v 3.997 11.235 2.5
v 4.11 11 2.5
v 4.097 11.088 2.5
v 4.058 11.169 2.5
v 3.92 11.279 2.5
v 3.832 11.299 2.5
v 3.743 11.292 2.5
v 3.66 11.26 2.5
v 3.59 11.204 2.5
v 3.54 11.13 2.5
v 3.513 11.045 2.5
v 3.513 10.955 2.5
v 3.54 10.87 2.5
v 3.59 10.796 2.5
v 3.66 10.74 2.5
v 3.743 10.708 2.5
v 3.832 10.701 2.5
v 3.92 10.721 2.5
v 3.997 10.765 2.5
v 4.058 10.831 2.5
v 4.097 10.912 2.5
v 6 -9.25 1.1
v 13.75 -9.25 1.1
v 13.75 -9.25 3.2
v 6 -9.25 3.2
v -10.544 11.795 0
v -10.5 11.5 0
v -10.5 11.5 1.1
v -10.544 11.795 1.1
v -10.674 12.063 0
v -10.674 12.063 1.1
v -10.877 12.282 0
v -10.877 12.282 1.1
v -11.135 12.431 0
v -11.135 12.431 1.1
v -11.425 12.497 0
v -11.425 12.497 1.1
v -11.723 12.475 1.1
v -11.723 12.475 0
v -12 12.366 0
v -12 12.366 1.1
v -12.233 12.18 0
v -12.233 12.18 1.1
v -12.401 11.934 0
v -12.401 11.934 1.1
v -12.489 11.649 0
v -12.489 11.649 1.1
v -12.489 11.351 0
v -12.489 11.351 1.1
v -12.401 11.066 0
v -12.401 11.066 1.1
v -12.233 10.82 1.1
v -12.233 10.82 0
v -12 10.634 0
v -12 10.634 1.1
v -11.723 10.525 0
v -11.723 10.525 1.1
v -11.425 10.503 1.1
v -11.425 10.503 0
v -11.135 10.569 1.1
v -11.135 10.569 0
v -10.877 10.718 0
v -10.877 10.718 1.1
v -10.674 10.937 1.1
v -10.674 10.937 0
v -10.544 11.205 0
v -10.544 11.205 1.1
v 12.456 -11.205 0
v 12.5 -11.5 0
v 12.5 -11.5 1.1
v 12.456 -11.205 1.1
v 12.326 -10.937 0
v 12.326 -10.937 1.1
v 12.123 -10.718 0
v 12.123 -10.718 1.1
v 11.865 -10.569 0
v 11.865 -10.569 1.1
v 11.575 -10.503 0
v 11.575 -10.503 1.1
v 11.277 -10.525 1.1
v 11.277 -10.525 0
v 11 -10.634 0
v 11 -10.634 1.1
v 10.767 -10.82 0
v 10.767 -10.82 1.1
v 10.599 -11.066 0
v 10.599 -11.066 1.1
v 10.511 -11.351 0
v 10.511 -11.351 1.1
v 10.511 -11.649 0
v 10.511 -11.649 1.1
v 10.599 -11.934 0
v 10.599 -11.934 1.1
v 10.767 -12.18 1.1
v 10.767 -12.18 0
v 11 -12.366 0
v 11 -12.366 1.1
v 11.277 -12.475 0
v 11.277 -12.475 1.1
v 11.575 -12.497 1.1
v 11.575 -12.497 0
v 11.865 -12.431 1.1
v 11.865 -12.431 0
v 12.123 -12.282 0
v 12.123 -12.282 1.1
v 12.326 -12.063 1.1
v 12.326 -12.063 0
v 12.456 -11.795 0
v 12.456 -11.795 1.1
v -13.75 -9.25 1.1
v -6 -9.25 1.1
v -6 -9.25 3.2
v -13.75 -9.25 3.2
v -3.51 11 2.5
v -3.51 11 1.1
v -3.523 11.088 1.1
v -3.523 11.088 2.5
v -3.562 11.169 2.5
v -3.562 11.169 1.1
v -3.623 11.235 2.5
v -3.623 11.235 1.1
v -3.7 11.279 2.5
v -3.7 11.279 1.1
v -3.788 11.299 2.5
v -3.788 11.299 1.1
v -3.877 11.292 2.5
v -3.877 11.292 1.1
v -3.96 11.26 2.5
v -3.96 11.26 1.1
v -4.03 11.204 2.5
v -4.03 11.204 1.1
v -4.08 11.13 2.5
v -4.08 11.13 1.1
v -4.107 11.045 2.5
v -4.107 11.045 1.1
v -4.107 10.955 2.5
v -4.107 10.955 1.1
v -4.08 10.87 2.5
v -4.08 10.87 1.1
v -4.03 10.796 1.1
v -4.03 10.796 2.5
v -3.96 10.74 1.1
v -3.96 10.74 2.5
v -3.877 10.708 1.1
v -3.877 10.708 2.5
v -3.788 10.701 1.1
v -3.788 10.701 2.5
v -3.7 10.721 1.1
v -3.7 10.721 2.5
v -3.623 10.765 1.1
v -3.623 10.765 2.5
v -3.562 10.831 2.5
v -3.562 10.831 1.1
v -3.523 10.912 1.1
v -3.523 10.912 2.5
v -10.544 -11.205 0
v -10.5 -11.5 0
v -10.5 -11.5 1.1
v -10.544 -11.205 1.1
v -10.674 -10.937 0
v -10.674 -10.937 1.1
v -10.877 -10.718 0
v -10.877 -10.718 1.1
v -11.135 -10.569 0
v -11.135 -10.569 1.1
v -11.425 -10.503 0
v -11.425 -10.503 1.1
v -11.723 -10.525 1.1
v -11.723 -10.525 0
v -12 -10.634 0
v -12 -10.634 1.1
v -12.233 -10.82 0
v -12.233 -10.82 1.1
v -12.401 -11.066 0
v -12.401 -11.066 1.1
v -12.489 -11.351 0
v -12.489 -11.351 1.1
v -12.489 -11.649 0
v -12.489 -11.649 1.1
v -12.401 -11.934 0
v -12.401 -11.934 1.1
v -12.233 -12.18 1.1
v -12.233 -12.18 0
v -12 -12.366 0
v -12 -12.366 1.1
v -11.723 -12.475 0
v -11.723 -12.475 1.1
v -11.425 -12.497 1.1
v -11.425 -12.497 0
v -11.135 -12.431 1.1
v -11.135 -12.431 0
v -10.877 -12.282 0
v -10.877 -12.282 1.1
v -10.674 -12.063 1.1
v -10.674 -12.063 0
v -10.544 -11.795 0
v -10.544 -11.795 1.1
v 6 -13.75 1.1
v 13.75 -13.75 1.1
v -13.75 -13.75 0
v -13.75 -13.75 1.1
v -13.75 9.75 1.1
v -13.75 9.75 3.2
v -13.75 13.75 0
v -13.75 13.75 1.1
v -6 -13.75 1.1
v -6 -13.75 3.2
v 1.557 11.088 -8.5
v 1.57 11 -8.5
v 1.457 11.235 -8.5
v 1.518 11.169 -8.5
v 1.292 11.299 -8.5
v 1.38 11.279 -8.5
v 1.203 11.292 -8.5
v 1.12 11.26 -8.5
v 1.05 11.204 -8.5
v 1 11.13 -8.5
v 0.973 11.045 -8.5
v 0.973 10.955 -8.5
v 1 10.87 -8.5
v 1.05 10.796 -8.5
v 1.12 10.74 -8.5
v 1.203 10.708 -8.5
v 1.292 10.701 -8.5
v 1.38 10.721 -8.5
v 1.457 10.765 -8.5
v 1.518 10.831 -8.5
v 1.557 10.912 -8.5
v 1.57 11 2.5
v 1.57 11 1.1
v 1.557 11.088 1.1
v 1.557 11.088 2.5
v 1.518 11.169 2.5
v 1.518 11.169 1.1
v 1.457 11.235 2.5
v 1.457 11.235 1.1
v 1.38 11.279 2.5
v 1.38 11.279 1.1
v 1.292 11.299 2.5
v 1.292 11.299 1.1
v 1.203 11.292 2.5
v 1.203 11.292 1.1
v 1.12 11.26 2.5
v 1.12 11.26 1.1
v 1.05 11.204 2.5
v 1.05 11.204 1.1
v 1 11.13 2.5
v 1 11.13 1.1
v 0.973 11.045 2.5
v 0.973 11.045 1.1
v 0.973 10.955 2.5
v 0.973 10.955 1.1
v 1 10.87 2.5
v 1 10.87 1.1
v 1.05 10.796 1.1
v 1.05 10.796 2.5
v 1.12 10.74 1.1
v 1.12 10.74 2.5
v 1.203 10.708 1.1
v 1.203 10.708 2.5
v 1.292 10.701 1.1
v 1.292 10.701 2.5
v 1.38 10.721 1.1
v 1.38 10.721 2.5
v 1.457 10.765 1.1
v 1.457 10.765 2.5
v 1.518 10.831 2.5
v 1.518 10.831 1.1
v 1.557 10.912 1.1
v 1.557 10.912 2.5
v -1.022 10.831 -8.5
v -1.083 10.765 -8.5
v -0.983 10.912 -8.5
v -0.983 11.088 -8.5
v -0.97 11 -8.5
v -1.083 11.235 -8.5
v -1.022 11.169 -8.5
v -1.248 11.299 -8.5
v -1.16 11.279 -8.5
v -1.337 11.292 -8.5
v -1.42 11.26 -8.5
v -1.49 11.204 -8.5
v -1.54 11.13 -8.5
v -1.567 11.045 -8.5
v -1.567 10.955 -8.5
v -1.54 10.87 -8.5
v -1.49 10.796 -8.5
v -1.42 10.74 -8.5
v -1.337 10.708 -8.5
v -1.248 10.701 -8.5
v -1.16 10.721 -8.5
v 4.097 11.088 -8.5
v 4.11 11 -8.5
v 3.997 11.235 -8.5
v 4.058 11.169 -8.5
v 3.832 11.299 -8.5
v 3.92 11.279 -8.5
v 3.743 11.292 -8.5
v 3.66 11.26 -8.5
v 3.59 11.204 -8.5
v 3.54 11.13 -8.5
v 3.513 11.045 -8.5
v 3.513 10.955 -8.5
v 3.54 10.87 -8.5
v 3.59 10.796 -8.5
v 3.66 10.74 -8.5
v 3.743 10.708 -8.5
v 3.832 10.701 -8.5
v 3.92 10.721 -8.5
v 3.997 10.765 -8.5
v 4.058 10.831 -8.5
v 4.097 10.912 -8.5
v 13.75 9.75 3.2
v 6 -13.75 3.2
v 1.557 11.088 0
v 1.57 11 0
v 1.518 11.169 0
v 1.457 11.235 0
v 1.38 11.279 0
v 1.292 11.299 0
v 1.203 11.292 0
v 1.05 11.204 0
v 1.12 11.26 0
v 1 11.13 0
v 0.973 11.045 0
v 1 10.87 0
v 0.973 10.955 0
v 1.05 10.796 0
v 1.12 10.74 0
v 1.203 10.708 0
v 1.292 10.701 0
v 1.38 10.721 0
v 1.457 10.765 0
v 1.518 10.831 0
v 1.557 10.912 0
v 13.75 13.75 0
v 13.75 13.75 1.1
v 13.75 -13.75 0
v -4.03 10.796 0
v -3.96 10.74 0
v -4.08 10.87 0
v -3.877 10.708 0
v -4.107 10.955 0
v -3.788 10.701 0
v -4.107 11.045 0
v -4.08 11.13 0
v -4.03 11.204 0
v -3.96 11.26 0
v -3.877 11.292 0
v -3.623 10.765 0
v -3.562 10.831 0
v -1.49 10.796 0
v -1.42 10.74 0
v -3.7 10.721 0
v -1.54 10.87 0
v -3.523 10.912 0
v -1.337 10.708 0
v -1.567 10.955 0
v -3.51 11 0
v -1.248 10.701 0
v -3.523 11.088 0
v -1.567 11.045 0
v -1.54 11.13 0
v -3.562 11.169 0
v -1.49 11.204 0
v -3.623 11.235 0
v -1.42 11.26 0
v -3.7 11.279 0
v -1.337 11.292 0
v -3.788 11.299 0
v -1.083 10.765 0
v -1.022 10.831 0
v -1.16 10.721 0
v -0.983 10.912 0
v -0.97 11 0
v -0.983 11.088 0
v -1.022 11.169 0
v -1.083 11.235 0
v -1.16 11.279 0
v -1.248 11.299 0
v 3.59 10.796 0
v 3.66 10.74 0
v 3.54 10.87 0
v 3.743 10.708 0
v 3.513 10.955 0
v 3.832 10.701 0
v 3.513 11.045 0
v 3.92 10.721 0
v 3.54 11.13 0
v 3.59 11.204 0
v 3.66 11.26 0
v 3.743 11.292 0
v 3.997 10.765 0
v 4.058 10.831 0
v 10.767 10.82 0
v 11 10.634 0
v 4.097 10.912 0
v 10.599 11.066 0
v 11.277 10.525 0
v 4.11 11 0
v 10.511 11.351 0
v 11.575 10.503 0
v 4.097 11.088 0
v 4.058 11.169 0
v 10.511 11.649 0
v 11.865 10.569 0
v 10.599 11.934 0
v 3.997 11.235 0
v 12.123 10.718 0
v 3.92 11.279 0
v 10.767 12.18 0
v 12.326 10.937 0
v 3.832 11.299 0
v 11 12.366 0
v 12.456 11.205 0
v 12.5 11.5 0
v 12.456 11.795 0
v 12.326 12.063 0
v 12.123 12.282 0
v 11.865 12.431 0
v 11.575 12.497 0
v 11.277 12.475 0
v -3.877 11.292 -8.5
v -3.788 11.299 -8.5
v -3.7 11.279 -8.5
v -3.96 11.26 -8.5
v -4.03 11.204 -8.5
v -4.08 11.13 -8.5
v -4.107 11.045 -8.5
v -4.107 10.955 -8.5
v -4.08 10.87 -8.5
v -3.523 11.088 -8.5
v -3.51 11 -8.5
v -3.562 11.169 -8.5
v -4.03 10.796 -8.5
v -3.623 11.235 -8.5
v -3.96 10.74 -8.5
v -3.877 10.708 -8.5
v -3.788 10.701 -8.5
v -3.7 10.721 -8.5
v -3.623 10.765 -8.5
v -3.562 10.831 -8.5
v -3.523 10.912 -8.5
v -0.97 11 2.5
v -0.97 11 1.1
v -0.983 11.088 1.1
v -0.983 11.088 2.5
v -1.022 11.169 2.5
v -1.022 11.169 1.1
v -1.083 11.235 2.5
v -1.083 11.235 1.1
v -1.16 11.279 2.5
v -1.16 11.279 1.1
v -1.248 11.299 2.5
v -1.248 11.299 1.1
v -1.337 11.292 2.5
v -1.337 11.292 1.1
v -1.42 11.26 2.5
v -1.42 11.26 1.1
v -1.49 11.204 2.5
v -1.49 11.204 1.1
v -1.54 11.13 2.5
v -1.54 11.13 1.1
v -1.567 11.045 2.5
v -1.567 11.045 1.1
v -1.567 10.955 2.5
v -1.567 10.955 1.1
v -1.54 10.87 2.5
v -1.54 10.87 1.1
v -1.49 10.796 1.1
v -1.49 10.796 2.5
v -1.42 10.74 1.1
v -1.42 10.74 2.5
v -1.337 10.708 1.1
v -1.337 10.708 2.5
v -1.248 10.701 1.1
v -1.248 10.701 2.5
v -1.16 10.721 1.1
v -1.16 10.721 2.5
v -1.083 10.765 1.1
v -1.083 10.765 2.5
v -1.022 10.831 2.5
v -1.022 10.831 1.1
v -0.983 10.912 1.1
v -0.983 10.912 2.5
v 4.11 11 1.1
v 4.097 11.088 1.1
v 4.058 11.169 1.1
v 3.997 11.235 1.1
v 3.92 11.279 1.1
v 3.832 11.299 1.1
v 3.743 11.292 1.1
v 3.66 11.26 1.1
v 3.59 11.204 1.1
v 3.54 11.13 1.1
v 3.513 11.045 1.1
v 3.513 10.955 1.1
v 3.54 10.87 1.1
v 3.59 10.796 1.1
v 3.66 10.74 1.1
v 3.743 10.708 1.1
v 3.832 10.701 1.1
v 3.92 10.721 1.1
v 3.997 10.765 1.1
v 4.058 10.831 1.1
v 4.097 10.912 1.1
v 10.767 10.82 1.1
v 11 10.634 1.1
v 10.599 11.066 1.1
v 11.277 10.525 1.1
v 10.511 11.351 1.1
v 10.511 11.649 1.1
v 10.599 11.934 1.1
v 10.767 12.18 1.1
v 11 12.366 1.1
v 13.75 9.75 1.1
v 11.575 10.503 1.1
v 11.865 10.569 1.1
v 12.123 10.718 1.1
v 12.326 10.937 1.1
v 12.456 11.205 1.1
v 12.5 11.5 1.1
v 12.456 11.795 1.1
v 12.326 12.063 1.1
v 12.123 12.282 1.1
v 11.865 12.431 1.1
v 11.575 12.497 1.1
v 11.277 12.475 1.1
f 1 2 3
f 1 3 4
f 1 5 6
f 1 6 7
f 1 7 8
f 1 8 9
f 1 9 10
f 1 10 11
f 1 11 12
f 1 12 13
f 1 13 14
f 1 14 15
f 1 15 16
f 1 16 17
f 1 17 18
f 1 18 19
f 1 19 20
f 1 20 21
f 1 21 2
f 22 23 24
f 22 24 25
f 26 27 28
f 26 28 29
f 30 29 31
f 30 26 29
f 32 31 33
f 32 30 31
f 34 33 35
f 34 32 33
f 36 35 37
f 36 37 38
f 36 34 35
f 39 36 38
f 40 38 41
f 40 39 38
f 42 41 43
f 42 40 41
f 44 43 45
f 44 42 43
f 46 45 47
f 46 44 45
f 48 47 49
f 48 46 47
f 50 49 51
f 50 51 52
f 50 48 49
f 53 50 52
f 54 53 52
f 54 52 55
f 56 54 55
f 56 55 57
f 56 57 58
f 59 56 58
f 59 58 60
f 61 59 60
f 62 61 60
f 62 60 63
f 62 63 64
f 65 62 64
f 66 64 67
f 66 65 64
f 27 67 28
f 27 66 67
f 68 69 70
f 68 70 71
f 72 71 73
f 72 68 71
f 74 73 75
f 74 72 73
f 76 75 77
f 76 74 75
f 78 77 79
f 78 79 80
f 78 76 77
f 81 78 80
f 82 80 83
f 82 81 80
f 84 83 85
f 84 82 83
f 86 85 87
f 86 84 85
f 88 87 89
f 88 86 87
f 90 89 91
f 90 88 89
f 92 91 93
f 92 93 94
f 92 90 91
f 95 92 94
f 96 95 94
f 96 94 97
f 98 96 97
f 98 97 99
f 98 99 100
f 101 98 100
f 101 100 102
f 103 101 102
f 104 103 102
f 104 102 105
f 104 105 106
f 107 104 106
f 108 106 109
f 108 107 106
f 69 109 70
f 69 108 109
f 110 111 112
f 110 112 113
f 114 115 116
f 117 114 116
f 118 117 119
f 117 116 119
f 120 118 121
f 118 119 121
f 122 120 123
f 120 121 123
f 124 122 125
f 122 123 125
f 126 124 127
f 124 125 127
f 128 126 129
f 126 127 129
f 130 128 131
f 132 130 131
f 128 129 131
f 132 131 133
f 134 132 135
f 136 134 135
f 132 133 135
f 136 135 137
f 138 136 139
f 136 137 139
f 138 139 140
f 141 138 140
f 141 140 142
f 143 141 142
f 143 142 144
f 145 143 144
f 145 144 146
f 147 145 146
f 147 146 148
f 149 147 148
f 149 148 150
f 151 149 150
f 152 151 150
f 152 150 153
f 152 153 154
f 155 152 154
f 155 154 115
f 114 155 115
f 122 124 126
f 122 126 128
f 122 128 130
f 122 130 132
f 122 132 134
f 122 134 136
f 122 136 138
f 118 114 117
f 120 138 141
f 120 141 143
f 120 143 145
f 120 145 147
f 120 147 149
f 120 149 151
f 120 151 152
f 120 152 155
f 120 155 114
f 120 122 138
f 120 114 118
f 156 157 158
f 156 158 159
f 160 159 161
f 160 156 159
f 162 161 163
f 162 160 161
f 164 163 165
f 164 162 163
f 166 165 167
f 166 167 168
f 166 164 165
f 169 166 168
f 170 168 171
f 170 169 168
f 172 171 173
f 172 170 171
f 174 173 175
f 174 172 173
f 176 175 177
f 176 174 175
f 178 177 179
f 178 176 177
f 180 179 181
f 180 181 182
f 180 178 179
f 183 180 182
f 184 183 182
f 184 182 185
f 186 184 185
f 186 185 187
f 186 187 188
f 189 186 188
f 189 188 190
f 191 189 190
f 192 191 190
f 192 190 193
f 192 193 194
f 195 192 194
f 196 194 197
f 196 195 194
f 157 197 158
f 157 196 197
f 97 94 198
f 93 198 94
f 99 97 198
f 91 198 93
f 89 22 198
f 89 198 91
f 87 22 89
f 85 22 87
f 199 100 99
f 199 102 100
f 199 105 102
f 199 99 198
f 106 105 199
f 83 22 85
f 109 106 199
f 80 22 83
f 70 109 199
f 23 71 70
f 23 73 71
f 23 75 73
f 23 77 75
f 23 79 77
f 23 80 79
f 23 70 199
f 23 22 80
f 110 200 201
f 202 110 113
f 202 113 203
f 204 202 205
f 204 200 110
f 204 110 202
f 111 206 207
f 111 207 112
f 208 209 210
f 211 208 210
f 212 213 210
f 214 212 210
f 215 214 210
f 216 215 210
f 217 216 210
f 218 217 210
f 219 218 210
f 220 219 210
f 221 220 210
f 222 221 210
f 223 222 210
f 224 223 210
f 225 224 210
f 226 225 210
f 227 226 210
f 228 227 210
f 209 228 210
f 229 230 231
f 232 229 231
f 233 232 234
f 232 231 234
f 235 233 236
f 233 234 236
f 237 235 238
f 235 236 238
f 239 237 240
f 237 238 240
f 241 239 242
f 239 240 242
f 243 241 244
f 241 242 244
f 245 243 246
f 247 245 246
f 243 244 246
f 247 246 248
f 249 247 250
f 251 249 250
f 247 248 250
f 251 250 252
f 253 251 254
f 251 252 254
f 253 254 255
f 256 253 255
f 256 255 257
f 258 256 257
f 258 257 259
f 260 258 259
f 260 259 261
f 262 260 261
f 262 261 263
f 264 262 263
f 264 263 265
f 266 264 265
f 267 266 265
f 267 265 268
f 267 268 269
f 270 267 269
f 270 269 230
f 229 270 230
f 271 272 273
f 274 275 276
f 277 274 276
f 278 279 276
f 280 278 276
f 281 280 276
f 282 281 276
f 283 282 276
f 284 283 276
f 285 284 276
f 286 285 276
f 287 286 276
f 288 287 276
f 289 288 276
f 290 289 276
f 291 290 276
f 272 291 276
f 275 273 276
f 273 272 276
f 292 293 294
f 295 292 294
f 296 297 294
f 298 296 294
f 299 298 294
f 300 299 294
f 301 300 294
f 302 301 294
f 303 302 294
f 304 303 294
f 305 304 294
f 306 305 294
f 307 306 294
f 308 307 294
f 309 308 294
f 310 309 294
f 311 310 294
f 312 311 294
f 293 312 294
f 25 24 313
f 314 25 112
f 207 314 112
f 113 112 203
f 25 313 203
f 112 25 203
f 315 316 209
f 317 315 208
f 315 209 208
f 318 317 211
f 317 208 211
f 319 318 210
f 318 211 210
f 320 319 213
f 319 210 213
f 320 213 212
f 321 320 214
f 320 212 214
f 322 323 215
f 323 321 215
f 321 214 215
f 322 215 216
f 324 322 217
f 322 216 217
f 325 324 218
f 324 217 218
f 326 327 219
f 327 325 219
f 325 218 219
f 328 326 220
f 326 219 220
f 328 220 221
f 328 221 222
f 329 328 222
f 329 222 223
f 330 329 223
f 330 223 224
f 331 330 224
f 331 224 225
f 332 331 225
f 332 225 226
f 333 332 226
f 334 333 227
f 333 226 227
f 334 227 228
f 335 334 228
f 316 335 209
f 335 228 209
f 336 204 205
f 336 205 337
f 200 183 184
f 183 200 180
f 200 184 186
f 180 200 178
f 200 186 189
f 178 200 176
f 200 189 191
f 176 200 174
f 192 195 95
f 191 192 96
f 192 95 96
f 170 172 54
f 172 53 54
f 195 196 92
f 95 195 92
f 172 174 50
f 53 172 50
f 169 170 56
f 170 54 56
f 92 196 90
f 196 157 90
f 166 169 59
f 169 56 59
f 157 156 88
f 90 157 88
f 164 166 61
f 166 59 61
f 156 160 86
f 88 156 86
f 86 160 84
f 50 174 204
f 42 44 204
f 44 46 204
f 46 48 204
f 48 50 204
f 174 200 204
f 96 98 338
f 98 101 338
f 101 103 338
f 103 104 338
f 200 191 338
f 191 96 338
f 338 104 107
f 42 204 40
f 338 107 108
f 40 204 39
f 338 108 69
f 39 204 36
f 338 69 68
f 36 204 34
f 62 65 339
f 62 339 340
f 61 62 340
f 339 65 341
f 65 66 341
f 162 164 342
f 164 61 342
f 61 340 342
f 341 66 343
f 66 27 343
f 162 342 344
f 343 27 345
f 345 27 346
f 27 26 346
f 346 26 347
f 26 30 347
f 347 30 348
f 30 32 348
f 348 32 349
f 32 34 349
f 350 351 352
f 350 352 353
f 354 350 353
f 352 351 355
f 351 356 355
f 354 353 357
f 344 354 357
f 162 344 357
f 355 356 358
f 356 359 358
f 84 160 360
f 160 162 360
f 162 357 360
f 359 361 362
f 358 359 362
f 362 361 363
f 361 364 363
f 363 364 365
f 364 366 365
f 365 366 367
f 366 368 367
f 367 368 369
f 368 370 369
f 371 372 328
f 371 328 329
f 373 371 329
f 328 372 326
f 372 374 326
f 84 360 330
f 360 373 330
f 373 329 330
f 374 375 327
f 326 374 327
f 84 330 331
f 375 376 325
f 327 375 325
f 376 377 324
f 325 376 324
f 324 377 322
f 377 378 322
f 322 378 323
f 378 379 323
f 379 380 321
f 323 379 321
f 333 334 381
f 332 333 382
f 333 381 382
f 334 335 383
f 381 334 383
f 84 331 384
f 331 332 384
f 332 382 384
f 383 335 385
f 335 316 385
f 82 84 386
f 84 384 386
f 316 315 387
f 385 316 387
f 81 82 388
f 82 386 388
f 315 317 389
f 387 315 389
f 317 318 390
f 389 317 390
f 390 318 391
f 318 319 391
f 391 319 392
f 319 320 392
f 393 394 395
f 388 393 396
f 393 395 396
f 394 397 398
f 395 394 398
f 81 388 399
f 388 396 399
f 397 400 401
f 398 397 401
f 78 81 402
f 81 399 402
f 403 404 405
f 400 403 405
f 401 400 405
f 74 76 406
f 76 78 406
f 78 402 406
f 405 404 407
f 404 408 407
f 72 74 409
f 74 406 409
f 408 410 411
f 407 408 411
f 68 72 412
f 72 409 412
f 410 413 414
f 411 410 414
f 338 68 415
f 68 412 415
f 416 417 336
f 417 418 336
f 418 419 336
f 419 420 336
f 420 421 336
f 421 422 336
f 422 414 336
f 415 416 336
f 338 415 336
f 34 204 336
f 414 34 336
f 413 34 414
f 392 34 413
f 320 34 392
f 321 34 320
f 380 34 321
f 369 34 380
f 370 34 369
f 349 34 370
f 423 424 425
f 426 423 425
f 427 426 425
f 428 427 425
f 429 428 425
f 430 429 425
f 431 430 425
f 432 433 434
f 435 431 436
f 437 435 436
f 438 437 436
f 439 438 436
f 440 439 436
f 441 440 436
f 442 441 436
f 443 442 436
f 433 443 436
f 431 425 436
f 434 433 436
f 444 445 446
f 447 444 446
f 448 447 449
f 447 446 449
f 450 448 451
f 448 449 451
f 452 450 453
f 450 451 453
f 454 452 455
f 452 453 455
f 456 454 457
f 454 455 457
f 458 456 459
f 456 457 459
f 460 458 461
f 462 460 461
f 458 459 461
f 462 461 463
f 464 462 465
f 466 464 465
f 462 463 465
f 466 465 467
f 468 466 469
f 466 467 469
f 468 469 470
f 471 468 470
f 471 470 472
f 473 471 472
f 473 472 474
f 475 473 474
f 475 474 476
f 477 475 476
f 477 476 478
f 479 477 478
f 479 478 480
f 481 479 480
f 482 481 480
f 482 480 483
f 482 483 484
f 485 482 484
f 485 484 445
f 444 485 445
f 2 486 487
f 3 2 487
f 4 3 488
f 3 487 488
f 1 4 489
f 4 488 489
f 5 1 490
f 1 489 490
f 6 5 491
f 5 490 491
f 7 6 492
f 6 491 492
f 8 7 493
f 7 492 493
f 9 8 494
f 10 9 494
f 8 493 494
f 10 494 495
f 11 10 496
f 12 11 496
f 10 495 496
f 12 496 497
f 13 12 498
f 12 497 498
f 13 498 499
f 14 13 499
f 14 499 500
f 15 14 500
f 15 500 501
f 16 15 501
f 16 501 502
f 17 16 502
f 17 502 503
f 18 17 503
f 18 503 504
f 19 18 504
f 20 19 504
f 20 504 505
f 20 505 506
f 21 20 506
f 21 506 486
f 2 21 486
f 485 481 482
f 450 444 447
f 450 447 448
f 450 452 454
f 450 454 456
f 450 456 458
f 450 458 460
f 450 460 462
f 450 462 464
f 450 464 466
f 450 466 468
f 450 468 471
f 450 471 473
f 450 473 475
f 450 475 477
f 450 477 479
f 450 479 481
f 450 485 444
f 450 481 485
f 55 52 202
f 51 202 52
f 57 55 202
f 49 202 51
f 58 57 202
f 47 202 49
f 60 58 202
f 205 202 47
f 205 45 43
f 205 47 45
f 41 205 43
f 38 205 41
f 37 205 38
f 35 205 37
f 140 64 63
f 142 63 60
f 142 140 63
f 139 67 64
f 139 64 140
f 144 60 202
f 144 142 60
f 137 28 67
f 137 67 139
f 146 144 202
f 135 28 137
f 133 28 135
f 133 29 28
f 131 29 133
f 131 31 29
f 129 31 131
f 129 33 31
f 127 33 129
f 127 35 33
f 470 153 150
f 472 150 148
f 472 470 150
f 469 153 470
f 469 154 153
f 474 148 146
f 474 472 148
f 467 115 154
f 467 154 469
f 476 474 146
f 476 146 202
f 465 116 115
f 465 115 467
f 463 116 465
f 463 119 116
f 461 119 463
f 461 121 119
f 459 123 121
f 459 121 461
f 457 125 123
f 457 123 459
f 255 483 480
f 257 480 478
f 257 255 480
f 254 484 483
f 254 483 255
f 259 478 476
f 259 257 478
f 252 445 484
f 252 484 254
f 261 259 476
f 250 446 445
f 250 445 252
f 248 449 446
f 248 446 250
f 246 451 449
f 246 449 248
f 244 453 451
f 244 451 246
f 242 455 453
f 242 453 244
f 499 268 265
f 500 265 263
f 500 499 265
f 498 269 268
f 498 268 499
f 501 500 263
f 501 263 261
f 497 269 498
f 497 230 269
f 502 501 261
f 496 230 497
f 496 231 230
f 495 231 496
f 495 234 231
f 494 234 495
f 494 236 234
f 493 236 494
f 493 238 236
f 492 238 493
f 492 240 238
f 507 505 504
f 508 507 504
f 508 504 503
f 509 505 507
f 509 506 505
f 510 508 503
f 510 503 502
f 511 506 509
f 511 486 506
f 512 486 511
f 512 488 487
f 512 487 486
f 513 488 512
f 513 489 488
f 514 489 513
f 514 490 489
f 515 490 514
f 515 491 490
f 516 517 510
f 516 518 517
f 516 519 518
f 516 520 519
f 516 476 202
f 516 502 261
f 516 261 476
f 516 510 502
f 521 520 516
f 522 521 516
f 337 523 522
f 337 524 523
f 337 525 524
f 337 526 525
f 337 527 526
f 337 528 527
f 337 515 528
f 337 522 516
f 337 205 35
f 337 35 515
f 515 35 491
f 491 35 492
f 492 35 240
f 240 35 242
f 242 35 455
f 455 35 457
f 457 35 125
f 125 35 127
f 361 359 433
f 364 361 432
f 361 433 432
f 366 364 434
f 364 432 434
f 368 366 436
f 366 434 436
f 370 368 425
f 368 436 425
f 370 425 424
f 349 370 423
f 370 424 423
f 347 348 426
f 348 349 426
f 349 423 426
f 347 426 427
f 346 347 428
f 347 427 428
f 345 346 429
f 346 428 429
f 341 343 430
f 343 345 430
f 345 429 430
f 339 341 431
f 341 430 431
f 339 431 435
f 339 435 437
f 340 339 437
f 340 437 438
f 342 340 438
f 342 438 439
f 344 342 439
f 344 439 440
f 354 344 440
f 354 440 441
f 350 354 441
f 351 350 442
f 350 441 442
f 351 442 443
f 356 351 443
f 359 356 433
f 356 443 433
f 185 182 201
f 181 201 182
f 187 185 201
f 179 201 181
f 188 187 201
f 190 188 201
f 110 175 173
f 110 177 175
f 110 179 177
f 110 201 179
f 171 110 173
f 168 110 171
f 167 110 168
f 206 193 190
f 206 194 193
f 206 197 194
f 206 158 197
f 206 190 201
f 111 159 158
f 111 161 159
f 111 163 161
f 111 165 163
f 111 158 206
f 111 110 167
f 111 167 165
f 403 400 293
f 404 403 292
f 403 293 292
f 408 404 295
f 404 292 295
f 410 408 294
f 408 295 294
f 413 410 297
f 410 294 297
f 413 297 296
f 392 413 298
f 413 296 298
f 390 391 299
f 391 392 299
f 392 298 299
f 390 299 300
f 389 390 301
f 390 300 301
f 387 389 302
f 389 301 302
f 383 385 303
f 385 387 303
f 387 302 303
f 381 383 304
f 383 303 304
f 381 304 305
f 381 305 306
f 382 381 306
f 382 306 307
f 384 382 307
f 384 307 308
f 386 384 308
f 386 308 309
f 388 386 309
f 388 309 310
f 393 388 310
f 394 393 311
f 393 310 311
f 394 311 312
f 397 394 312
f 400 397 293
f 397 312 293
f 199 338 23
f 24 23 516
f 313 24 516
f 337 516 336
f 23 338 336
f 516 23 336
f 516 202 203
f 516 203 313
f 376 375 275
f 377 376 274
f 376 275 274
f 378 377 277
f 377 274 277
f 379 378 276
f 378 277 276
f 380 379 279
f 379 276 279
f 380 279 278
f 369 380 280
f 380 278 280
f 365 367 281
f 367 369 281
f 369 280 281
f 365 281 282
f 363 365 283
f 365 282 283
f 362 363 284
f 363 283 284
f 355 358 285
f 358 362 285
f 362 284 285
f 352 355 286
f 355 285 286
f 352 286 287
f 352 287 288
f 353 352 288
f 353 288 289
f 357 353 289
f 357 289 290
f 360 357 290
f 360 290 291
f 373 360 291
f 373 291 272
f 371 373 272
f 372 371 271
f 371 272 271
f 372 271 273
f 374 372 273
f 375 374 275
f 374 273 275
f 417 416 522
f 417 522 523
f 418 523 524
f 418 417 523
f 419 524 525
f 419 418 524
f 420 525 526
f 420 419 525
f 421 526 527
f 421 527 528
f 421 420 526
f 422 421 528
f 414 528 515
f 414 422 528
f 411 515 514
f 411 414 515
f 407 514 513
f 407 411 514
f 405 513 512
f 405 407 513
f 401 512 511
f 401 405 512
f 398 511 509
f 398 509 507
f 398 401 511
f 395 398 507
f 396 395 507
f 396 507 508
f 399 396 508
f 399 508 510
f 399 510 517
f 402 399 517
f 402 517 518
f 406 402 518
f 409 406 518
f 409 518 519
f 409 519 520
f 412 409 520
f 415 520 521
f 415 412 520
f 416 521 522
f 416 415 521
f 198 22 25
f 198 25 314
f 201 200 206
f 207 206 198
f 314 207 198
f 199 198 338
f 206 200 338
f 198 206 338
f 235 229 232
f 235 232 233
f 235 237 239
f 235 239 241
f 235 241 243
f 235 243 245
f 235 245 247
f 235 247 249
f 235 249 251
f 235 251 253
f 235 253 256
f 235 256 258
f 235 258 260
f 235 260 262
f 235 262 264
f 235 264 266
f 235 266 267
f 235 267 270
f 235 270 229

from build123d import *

# Parameters (mm, degrees)
CYLINDER_R        = 0.3
CYLINDER_DEPTH    = 11
CYLINDER001_R     = 0.3
CYLINDER001_DEPTH = 11
CYLINDER002_R     = 0.3
CYLINDER002_DEPTH = 11
CYLINDER003_R     = 0.3
CYLINDER003_DEPTH = 11
SKETCH_W          = 27.5
SKETCH_H          = 27.5
PAD_DEPTH         = 1.1
SKETCH001_R       = 1
POCKET_DEPTH      = 1.1
PAD001_DEPTH      = 2.1


with BuildPart() as zylinder:
    # Cylinder → Cylinder (new body)
    with BuildSketch(Plane(origin=(-3.81, 11, -8.5), x_dir=(1, 0, 0), z_dir=(0, 0, 1))):
        Circle(CYLINDER_R)
    extrude(amount=CYLINDER_DEPTH)


with BuildPart() as zylinder001:
    # Cylinder001 → Cylinder001 (new body)
    with BuildSketch(Plane(origin=(-1.27, 11, -8.5), x_dir=(1, 0, 0), z_dir=(0, 0, 1))):
        Circle(CYLINDER001_R)
    extrude(amount=CYLINDER001_DEPTH)


with BuildPart() as zylinder002:
    # Cylinder002 → Cylinder002 (new body)
    with BuildSketch(Plane(origin=(3.81, 11, -8.5), x_dir=(1, 0, 0), z_dir=(0, 0, 1))):
        Circle(CYLINDER002_R)
    extrude(amount=CYLINDER002_DEPTH)


with BuildPart() as zylinder003:
    # Cylinder003 → Cylinder003 (new body)
    with BuildSketch(Plane(origin=(1.27, 11, -8.5), x_dir=(1, 0, 0), z_dir=(0, 0, 1))):
        Circle(CYLINDER003_R)
    extrude(amount=CYLINDER003_DEPTH)


with BuildPart() as fusion:
    # Sketch → Pad (new body)
    with BuildSketch(Plane.XY):
        Rectangle(SKETCH_W, SKETCH_H)
    extrude(amount=PAD_DEPTH)

    # Sketch001 → Pocket (cut)
    with BuildSketch(Plane.XY):
        with Locations((-11.5, 11.5)):
            Circle(SKETCH001_R)
        with Locations((11.5, 11.5)):
            Circle(SKETCH001_R)
        with Locations((11.5, -11.5)):
            Circle(SKETCH001_R)
        with Locations((-11.5, -11.5)):
            Circle(SKETCH001_R)
    extrude(amount=POCKET_DEPTH, mode=Mode.SUBTRACT)

    # Sketch002 (on Face5 of Pocket) → Pad001 (join)
    with BuildSketch(Plane.XY.offset(1.1)):
        Polygon((-13.75, 9.75), (13.75, 9.75), (13.75, -9.25), (6, -9.25), (6, -13.75), (-6, -13.75), (-6, -9.25), (-13.75, -9.25), align=None)
    extrude(amount=PAD001_DEPTH)

    # Fusion: union Zylinder, Zylinder001, Zylinder002, Zylinder003
    add(zylinder.part)
    add(zylinder001.part)
    add(zylinder002.part)
    add(zylinder003.part)


solid = fusion.part
